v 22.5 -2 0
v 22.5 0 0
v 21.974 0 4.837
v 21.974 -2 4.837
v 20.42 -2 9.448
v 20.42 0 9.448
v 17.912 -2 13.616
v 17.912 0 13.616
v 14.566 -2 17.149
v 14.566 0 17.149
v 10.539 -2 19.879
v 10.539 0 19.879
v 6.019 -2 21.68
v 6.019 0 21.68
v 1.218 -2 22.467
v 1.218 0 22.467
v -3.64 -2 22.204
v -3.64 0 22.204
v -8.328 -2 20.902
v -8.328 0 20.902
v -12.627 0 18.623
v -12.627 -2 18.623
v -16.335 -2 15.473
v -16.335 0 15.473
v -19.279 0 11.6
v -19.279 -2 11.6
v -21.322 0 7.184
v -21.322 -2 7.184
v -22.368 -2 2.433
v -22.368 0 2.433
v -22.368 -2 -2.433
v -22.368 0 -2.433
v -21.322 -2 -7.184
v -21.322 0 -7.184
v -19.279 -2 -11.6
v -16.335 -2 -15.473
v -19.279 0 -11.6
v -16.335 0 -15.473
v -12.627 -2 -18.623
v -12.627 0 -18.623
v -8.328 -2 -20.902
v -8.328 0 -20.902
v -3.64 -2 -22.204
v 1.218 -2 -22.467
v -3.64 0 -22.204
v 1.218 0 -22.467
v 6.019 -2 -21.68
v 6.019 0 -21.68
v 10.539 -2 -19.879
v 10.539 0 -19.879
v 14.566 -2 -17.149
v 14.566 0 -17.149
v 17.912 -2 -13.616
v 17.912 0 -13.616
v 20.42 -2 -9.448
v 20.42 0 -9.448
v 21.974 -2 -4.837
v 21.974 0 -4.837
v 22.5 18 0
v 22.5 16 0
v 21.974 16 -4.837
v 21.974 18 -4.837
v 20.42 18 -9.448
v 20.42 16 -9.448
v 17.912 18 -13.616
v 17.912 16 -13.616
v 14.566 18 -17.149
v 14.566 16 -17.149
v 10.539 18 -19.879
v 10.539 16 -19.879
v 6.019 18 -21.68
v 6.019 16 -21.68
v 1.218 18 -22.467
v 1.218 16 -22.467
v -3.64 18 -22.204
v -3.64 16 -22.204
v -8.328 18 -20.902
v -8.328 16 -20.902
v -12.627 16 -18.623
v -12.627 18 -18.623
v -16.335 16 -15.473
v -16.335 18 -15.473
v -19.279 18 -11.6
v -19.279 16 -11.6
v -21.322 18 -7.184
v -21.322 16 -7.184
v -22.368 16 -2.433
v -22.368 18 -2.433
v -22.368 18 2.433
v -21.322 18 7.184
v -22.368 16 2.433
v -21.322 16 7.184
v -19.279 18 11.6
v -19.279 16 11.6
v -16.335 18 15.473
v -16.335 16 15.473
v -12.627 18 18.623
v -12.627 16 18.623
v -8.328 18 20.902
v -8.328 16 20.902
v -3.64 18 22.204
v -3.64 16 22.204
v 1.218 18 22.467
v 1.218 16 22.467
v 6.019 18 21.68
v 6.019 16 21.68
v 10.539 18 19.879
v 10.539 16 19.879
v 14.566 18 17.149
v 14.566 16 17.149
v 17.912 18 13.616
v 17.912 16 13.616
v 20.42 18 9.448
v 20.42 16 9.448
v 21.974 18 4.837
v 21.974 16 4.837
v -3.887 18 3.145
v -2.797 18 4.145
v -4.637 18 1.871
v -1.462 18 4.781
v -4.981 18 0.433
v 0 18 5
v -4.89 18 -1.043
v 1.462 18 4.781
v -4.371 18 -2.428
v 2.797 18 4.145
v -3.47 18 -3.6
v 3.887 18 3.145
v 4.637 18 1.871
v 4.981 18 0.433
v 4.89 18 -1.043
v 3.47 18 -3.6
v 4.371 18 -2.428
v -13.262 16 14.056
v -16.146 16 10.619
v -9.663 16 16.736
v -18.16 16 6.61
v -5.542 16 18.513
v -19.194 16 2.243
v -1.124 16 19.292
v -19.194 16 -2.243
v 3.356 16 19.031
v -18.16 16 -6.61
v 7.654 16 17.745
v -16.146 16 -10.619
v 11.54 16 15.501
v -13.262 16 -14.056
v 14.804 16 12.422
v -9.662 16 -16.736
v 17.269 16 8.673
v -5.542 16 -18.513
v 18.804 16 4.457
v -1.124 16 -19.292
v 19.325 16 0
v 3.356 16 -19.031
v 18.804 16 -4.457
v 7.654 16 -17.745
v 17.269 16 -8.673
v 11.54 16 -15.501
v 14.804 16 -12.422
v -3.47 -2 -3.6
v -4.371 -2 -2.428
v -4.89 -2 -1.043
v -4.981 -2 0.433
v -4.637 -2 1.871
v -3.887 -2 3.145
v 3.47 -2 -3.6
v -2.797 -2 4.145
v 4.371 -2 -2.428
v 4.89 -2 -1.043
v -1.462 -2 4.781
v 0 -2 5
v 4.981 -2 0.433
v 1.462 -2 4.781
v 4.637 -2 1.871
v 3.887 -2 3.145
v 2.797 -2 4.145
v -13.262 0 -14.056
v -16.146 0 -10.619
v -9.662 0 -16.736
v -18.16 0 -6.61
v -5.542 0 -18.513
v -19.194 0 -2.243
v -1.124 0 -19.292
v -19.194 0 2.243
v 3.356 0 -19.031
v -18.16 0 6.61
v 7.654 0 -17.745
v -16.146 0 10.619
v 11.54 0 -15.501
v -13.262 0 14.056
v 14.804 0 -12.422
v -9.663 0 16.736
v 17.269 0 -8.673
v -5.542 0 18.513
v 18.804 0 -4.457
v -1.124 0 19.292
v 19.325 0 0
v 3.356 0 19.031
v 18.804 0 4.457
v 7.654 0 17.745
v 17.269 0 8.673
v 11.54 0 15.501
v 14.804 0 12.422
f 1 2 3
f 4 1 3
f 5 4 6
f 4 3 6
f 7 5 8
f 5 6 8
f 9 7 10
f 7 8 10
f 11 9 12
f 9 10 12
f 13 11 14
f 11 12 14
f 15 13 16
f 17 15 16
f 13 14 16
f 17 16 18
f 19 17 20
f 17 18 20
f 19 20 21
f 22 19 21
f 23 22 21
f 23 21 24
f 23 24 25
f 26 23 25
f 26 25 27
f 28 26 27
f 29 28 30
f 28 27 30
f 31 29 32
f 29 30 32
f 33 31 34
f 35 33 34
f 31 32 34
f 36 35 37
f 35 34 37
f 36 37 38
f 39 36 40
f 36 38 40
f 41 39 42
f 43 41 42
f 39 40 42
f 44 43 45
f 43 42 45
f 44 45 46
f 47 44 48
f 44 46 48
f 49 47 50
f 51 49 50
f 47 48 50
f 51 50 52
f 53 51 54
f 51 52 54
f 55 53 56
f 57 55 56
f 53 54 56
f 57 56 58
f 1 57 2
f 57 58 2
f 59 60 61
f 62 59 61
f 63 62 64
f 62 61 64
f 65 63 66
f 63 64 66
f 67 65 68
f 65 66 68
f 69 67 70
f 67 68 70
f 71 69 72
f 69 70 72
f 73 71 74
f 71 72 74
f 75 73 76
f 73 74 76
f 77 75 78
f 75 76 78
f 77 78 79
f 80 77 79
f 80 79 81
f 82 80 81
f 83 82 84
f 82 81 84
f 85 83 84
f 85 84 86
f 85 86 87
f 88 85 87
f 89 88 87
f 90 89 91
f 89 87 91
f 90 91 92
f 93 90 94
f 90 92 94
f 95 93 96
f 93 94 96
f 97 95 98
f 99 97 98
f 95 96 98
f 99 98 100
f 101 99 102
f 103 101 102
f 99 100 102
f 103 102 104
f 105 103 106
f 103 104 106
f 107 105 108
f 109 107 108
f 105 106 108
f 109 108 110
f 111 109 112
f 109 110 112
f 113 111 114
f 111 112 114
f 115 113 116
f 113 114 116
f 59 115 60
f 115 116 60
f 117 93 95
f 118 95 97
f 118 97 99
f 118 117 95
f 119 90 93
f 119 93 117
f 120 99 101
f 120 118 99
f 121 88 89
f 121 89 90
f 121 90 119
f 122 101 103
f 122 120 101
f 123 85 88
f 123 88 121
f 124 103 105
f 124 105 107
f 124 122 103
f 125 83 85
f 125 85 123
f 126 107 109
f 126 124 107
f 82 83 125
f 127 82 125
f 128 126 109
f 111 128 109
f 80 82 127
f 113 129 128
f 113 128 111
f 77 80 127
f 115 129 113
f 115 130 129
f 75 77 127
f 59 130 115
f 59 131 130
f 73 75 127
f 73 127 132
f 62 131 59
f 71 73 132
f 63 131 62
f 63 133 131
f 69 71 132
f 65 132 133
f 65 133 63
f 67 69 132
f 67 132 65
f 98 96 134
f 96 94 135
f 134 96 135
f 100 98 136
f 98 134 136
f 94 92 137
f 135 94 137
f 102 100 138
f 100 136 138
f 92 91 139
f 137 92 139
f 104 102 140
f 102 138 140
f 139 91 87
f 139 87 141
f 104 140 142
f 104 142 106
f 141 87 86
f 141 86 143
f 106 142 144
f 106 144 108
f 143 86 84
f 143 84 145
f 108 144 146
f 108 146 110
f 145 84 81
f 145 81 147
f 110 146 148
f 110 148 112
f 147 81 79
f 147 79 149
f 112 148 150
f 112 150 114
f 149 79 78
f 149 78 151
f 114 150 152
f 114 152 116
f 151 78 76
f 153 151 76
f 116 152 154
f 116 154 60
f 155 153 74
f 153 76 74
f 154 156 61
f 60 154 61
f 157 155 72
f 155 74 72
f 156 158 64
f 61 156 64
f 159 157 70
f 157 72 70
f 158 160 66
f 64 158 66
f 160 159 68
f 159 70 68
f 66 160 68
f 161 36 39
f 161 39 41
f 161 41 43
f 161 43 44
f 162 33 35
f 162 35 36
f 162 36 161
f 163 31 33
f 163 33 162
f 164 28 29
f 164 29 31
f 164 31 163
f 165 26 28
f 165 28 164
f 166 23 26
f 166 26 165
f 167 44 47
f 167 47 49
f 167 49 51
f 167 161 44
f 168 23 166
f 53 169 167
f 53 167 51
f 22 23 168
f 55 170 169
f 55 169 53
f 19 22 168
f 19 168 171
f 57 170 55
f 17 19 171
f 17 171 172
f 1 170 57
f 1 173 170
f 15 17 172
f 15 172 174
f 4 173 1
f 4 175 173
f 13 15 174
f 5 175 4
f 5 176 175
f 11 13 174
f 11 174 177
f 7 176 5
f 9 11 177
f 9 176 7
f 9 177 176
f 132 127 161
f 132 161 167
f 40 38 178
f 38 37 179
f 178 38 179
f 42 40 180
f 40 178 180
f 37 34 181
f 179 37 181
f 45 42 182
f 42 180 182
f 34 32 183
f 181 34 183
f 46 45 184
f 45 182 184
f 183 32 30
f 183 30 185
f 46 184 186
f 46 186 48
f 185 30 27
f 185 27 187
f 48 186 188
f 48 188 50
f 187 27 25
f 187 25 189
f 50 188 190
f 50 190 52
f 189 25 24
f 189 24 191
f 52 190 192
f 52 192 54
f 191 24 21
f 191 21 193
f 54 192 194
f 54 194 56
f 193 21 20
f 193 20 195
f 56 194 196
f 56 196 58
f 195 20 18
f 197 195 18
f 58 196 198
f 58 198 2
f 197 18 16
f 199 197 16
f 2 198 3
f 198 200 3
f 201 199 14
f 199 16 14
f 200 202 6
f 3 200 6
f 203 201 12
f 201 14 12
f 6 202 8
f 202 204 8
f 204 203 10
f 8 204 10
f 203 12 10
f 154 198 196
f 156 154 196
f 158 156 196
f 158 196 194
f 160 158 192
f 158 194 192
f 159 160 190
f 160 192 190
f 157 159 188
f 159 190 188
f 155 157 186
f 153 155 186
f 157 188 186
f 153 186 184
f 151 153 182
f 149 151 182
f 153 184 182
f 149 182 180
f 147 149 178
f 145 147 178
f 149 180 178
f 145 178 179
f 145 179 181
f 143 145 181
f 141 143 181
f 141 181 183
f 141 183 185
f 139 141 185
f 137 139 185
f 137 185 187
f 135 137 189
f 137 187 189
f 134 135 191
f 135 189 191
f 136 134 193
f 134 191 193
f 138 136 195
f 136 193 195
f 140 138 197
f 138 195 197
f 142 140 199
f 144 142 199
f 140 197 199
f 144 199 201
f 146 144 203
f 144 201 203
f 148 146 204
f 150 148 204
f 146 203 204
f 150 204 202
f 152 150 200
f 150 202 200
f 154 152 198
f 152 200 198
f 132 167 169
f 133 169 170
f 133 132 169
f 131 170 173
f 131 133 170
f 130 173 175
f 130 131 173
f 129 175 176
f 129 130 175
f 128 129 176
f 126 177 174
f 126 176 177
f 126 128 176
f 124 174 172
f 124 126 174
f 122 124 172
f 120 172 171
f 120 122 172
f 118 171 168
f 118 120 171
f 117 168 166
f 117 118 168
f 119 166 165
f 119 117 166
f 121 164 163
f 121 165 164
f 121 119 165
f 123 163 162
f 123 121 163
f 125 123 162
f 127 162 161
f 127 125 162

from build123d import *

# Parameters (mm, degrees)
SKETCH_1_R          = 19.325
SKETCH_1_R_2        = 2.5
EXTRUDE_1_DEPTH     = 16
SKETCH_2_R          = 22.5
SKETCH_2_R_2        = 2.5
EXTRUDE_2_DEPTH     = 2
SKETCH_3_R          = 22.5
SKETCH_3_R_2        = 2.5
EXTRUDE_3_DEPTH     = 2
CUT_EXTRUDE_1_REACH = 22


with BuildPart() as part:
    # 草图1 → 凸台-拉伸1 (new body)
    with BuildSketch(Plane(origin=(0, 0, 0), x_dir=(1, 0, 0), z_dir=(0, 1, 0))):
        Circle(SKETCH_1_R)
        Circle(SKETCH_1_R_2, mode=Mode.SUBTRACT)
    extrude(amount=EXTRUDE_1_DEPTH)

    # 草图2 → 凸台-拉伸2 (add)
    with BuildSketch(Plane(origin=(0, 16, 0), x_dir=(1, 0, 0), z_dir=(0, 1, 0))):
        Circle(SKETCH_2_R)
        Circle(SKETCH_2_R_2, mode=Mode.SUBTRACT)
    extrude(amount=EXTRUDE_2_DEPTH)

    # 草图3 → 凸台-拉伸3 (add)
    with BuildSketch(Plane.XZ):
        Circle(SKETCH_3_R)
        Circle(SKETCH_3_R_2, mode=Mode.SUBTRACT)
    extrude(amount=EXTRUDE_3_DEPTH)

    # 草图4 → 切除-拉伸1 (cut, up to next)
    with BuildSketch(Plane(origin=(0, 18, 0), x_dir=(1, 0, 0), z_dir=(0, 1, 0)), mode=Mode.PRIVATE) as cut_extrude_1_sk1:
        with BuildLine():
            Line((-3.469870315, 3.6), (3.469870315, 3.6))
            ThreePointArc((3.469870315, 3.6), (0, -5), (-3.469870315, 3.6))
        make_face()
    cut_extrude_1_tool1 = extrude(cut_extrude_1_sk1.sketch, amount=-CUT_EXTRUDE_1_REACH, mode=Mode.PRIVATE) & part.part
    add(cut_extrude_1_tool1.solids().sort_by_distance((0, 18, 0.387599))[0], mode=Mode.SUBTRACT)


solid = part.part
